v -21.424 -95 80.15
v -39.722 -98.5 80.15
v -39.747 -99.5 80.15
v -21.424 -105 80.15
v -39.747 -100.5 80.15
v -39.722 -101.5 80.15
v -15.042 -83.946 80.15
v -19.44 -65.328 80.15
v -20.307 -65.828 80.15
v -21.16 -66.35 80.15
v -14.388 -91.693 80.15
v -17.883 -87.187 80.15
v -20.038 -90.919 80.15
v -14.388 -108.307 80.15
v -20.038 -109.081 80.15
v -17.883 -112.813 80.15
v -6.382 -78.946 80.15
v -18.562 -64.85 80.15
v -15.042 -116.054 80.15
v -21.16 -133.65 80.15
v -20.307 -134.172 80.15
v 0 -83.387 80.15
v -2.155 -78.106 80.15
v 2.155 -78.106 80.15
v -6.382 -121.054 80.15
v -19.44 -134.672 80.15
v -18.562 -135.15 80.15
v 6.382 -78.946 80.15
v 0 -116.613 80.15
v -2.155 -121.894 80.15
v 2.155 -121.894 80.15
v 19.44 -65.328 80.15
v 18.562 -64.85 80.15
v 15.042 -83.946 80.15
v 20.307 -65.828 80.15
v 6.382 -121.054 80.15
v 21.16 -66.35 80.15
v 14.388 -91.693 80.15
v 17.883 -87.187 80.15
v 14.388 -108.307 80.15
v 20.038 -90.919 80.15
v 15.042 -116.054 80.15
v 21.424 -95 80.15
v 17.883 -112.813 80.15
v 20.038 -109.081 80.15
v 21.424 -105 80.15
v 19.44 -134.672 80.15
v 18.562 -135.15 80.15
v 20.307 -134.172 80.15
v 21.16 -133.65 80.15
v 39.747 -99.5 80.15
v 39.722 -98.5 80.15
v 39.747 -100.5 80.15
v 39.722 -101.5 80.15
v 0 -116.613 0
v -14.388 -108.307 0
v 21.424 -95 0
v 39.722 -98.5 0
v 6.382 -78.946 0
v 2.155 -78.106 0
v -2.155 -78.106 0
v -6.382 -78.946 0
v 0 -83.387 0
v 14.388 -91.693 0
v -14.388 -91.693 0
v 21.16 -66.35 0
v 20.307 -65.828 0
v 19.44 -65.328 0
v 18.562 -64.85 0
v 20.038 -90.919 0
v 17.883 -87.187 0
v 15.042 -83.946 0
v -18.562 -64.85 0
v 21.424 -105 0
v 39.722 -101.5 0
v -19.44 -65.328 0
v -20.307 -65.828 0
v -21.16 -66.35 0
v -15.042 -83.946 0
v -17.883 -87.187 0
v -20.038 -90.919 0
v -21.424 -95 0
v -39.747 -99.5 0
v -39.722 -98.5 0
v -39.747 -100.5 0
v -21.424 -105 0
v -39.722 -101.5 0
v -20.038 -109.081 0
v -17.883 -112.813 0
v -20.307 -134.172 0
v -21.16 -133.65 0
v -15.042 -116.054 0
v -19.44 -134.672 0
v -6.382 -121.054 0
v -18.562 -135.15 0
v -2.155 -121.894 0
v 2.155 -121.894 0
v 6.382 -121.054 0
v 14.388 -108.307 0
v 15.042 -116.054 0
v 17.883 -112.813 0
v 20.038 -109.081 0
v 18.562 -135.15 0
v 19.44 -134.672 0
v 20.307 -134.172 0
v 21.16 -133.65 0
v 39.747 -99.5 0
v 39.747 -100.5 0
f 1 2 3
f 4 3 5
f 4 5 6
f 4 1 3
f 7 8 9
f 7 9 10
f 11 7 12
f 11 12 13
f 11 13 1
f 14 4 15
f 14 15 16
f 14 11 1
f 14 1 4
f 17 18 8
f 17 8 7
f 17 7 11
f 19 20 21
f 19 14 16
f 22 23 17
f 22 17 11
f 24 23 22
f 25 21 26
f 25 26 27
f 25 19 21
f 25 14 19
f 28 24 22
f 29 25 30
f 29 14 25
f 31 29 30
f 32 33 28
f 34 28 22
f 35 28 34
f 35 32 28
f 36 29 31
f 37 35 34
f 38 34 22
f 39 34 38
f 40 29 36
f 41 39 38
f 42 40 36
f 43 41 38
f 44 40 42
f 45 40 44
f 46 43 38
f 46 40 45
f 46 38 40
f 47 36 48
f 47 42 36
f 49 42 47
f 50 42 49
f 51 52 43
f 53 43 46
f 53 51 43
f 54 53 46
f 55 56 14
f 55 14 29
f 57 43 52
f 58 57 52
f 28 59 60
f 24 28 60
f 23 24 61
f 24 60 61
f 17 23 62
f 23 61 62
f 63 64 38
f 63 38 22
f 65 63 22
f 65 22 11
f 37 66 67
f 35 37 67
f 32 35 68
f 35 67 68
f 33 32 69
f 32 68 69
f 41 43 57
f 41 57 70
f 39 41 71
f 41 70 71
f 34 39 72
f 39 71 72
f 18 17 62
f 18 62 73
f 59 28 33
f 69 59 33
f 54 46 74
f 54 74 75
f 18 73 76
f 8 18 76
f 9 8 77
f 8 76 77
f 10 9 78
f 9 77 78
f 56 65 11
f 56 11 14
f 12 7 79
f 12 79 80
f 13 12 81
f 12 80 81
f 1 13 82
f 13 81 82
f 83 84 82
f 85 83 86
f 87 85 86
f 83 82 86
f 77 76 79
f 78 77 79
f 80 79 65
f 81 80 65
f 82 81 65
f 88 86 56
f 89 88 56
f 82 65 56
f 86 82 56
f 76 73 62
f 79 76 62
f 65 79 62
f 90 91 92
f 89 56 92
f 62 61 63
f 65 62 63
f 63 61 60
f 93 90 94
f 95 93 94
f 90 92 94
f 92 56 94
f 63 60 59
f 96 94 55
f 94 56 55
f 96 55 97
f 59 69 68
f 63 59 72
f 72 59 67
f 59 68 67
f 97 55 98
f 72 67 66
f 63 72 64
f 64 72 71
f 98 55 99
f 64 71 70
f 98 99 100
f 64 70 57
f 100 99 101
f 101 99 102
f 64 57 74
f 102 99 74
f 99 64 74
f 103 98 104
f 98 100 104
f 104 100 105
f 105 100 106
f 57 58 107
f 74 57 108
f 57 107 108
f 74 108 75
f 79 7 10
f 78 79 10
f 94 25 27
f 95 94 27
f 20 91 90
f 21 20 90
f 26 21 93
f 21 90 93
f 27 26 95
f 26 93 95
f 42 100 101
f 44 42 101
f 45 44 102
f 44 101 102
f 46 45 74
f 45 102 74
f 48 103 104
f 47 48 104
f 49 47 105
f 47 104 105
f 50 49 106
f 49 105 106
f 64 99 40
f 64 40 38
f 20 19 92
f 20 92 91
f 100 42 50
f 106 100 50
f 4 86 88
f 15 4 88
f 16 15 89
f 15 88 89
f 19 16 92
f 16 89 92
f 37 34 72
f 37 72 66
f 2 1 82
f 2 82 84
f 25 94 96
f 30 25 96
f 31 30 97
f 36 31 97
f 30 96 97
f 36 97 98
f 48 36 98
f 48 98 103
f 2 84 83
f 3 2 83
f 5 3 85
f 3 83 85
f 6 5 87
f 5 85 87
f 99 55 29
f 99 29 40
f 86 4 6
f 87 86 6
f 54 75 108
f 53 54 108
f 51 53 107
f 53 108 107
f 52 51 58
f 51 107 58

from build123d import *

# Parameters (mm, degrees)
SKETCH024_R           = 22
PAD011_DEPTH          = 80.15
PAD012_DEPTH          = 80.15
POLARPATTERN007_COUNT = 6
POCKET014_DEPTH       = 80.151


with BuildPart() as part:
    # Sketch024 → Pad011 (new body)
    with BuildSketch(Plane.XY):
        Circle(SKETCH024_R)
    extrude(amount=PAD011_DEPTH)

    # Sketch022 → Pad012 (join)
    with BuildSketch(Plane.XY):
        with BuildLine():
            ThreePointArc((39.721688, -1.5), (39.75, 0), (39.721688, 1.5))
            Line((21.424285, 5), (39.721688, 1.5))
            Line((21.424285, 5), (14.666667, 0))
            Line((14.666667, 0), (21.424285, -5))
            Line((21.424285, -5), (39.721688, -1.5))
        make_face()
    pad012 = extrude(amount=PAD012_DEPTH)

    # PolarPattern007: Pad012 ×6 about axis
    polarpattern007_axis = Axis((0, 0, 0), (0, 0, 1))
    for i in range(1, POLARPATTERN007_COUNT):
        add(pad012.rotate(polarpattern007_axis, i * 360 / POLARPATTERN007_COUNT))

    # Sketch023 → Pocket014 (cut, through all)
    with BuildSketch(Plane.XY):
        Polygon((14.3875, 8.306627), (0, 16.613254), (-14.3875, 8.306627), (-14.3875, -8.306627), (0, -16.613254), (14.3875, -8.306627), align=None)
    extrude(amount=POCKET014_DEPTH, mode=Mode.SUBTRACT)


with BuildPart() as part_1:
    # Body030 placement: moved
    add(part.part.moved(Location((0, -100, 0))))


solid = part_1.part
